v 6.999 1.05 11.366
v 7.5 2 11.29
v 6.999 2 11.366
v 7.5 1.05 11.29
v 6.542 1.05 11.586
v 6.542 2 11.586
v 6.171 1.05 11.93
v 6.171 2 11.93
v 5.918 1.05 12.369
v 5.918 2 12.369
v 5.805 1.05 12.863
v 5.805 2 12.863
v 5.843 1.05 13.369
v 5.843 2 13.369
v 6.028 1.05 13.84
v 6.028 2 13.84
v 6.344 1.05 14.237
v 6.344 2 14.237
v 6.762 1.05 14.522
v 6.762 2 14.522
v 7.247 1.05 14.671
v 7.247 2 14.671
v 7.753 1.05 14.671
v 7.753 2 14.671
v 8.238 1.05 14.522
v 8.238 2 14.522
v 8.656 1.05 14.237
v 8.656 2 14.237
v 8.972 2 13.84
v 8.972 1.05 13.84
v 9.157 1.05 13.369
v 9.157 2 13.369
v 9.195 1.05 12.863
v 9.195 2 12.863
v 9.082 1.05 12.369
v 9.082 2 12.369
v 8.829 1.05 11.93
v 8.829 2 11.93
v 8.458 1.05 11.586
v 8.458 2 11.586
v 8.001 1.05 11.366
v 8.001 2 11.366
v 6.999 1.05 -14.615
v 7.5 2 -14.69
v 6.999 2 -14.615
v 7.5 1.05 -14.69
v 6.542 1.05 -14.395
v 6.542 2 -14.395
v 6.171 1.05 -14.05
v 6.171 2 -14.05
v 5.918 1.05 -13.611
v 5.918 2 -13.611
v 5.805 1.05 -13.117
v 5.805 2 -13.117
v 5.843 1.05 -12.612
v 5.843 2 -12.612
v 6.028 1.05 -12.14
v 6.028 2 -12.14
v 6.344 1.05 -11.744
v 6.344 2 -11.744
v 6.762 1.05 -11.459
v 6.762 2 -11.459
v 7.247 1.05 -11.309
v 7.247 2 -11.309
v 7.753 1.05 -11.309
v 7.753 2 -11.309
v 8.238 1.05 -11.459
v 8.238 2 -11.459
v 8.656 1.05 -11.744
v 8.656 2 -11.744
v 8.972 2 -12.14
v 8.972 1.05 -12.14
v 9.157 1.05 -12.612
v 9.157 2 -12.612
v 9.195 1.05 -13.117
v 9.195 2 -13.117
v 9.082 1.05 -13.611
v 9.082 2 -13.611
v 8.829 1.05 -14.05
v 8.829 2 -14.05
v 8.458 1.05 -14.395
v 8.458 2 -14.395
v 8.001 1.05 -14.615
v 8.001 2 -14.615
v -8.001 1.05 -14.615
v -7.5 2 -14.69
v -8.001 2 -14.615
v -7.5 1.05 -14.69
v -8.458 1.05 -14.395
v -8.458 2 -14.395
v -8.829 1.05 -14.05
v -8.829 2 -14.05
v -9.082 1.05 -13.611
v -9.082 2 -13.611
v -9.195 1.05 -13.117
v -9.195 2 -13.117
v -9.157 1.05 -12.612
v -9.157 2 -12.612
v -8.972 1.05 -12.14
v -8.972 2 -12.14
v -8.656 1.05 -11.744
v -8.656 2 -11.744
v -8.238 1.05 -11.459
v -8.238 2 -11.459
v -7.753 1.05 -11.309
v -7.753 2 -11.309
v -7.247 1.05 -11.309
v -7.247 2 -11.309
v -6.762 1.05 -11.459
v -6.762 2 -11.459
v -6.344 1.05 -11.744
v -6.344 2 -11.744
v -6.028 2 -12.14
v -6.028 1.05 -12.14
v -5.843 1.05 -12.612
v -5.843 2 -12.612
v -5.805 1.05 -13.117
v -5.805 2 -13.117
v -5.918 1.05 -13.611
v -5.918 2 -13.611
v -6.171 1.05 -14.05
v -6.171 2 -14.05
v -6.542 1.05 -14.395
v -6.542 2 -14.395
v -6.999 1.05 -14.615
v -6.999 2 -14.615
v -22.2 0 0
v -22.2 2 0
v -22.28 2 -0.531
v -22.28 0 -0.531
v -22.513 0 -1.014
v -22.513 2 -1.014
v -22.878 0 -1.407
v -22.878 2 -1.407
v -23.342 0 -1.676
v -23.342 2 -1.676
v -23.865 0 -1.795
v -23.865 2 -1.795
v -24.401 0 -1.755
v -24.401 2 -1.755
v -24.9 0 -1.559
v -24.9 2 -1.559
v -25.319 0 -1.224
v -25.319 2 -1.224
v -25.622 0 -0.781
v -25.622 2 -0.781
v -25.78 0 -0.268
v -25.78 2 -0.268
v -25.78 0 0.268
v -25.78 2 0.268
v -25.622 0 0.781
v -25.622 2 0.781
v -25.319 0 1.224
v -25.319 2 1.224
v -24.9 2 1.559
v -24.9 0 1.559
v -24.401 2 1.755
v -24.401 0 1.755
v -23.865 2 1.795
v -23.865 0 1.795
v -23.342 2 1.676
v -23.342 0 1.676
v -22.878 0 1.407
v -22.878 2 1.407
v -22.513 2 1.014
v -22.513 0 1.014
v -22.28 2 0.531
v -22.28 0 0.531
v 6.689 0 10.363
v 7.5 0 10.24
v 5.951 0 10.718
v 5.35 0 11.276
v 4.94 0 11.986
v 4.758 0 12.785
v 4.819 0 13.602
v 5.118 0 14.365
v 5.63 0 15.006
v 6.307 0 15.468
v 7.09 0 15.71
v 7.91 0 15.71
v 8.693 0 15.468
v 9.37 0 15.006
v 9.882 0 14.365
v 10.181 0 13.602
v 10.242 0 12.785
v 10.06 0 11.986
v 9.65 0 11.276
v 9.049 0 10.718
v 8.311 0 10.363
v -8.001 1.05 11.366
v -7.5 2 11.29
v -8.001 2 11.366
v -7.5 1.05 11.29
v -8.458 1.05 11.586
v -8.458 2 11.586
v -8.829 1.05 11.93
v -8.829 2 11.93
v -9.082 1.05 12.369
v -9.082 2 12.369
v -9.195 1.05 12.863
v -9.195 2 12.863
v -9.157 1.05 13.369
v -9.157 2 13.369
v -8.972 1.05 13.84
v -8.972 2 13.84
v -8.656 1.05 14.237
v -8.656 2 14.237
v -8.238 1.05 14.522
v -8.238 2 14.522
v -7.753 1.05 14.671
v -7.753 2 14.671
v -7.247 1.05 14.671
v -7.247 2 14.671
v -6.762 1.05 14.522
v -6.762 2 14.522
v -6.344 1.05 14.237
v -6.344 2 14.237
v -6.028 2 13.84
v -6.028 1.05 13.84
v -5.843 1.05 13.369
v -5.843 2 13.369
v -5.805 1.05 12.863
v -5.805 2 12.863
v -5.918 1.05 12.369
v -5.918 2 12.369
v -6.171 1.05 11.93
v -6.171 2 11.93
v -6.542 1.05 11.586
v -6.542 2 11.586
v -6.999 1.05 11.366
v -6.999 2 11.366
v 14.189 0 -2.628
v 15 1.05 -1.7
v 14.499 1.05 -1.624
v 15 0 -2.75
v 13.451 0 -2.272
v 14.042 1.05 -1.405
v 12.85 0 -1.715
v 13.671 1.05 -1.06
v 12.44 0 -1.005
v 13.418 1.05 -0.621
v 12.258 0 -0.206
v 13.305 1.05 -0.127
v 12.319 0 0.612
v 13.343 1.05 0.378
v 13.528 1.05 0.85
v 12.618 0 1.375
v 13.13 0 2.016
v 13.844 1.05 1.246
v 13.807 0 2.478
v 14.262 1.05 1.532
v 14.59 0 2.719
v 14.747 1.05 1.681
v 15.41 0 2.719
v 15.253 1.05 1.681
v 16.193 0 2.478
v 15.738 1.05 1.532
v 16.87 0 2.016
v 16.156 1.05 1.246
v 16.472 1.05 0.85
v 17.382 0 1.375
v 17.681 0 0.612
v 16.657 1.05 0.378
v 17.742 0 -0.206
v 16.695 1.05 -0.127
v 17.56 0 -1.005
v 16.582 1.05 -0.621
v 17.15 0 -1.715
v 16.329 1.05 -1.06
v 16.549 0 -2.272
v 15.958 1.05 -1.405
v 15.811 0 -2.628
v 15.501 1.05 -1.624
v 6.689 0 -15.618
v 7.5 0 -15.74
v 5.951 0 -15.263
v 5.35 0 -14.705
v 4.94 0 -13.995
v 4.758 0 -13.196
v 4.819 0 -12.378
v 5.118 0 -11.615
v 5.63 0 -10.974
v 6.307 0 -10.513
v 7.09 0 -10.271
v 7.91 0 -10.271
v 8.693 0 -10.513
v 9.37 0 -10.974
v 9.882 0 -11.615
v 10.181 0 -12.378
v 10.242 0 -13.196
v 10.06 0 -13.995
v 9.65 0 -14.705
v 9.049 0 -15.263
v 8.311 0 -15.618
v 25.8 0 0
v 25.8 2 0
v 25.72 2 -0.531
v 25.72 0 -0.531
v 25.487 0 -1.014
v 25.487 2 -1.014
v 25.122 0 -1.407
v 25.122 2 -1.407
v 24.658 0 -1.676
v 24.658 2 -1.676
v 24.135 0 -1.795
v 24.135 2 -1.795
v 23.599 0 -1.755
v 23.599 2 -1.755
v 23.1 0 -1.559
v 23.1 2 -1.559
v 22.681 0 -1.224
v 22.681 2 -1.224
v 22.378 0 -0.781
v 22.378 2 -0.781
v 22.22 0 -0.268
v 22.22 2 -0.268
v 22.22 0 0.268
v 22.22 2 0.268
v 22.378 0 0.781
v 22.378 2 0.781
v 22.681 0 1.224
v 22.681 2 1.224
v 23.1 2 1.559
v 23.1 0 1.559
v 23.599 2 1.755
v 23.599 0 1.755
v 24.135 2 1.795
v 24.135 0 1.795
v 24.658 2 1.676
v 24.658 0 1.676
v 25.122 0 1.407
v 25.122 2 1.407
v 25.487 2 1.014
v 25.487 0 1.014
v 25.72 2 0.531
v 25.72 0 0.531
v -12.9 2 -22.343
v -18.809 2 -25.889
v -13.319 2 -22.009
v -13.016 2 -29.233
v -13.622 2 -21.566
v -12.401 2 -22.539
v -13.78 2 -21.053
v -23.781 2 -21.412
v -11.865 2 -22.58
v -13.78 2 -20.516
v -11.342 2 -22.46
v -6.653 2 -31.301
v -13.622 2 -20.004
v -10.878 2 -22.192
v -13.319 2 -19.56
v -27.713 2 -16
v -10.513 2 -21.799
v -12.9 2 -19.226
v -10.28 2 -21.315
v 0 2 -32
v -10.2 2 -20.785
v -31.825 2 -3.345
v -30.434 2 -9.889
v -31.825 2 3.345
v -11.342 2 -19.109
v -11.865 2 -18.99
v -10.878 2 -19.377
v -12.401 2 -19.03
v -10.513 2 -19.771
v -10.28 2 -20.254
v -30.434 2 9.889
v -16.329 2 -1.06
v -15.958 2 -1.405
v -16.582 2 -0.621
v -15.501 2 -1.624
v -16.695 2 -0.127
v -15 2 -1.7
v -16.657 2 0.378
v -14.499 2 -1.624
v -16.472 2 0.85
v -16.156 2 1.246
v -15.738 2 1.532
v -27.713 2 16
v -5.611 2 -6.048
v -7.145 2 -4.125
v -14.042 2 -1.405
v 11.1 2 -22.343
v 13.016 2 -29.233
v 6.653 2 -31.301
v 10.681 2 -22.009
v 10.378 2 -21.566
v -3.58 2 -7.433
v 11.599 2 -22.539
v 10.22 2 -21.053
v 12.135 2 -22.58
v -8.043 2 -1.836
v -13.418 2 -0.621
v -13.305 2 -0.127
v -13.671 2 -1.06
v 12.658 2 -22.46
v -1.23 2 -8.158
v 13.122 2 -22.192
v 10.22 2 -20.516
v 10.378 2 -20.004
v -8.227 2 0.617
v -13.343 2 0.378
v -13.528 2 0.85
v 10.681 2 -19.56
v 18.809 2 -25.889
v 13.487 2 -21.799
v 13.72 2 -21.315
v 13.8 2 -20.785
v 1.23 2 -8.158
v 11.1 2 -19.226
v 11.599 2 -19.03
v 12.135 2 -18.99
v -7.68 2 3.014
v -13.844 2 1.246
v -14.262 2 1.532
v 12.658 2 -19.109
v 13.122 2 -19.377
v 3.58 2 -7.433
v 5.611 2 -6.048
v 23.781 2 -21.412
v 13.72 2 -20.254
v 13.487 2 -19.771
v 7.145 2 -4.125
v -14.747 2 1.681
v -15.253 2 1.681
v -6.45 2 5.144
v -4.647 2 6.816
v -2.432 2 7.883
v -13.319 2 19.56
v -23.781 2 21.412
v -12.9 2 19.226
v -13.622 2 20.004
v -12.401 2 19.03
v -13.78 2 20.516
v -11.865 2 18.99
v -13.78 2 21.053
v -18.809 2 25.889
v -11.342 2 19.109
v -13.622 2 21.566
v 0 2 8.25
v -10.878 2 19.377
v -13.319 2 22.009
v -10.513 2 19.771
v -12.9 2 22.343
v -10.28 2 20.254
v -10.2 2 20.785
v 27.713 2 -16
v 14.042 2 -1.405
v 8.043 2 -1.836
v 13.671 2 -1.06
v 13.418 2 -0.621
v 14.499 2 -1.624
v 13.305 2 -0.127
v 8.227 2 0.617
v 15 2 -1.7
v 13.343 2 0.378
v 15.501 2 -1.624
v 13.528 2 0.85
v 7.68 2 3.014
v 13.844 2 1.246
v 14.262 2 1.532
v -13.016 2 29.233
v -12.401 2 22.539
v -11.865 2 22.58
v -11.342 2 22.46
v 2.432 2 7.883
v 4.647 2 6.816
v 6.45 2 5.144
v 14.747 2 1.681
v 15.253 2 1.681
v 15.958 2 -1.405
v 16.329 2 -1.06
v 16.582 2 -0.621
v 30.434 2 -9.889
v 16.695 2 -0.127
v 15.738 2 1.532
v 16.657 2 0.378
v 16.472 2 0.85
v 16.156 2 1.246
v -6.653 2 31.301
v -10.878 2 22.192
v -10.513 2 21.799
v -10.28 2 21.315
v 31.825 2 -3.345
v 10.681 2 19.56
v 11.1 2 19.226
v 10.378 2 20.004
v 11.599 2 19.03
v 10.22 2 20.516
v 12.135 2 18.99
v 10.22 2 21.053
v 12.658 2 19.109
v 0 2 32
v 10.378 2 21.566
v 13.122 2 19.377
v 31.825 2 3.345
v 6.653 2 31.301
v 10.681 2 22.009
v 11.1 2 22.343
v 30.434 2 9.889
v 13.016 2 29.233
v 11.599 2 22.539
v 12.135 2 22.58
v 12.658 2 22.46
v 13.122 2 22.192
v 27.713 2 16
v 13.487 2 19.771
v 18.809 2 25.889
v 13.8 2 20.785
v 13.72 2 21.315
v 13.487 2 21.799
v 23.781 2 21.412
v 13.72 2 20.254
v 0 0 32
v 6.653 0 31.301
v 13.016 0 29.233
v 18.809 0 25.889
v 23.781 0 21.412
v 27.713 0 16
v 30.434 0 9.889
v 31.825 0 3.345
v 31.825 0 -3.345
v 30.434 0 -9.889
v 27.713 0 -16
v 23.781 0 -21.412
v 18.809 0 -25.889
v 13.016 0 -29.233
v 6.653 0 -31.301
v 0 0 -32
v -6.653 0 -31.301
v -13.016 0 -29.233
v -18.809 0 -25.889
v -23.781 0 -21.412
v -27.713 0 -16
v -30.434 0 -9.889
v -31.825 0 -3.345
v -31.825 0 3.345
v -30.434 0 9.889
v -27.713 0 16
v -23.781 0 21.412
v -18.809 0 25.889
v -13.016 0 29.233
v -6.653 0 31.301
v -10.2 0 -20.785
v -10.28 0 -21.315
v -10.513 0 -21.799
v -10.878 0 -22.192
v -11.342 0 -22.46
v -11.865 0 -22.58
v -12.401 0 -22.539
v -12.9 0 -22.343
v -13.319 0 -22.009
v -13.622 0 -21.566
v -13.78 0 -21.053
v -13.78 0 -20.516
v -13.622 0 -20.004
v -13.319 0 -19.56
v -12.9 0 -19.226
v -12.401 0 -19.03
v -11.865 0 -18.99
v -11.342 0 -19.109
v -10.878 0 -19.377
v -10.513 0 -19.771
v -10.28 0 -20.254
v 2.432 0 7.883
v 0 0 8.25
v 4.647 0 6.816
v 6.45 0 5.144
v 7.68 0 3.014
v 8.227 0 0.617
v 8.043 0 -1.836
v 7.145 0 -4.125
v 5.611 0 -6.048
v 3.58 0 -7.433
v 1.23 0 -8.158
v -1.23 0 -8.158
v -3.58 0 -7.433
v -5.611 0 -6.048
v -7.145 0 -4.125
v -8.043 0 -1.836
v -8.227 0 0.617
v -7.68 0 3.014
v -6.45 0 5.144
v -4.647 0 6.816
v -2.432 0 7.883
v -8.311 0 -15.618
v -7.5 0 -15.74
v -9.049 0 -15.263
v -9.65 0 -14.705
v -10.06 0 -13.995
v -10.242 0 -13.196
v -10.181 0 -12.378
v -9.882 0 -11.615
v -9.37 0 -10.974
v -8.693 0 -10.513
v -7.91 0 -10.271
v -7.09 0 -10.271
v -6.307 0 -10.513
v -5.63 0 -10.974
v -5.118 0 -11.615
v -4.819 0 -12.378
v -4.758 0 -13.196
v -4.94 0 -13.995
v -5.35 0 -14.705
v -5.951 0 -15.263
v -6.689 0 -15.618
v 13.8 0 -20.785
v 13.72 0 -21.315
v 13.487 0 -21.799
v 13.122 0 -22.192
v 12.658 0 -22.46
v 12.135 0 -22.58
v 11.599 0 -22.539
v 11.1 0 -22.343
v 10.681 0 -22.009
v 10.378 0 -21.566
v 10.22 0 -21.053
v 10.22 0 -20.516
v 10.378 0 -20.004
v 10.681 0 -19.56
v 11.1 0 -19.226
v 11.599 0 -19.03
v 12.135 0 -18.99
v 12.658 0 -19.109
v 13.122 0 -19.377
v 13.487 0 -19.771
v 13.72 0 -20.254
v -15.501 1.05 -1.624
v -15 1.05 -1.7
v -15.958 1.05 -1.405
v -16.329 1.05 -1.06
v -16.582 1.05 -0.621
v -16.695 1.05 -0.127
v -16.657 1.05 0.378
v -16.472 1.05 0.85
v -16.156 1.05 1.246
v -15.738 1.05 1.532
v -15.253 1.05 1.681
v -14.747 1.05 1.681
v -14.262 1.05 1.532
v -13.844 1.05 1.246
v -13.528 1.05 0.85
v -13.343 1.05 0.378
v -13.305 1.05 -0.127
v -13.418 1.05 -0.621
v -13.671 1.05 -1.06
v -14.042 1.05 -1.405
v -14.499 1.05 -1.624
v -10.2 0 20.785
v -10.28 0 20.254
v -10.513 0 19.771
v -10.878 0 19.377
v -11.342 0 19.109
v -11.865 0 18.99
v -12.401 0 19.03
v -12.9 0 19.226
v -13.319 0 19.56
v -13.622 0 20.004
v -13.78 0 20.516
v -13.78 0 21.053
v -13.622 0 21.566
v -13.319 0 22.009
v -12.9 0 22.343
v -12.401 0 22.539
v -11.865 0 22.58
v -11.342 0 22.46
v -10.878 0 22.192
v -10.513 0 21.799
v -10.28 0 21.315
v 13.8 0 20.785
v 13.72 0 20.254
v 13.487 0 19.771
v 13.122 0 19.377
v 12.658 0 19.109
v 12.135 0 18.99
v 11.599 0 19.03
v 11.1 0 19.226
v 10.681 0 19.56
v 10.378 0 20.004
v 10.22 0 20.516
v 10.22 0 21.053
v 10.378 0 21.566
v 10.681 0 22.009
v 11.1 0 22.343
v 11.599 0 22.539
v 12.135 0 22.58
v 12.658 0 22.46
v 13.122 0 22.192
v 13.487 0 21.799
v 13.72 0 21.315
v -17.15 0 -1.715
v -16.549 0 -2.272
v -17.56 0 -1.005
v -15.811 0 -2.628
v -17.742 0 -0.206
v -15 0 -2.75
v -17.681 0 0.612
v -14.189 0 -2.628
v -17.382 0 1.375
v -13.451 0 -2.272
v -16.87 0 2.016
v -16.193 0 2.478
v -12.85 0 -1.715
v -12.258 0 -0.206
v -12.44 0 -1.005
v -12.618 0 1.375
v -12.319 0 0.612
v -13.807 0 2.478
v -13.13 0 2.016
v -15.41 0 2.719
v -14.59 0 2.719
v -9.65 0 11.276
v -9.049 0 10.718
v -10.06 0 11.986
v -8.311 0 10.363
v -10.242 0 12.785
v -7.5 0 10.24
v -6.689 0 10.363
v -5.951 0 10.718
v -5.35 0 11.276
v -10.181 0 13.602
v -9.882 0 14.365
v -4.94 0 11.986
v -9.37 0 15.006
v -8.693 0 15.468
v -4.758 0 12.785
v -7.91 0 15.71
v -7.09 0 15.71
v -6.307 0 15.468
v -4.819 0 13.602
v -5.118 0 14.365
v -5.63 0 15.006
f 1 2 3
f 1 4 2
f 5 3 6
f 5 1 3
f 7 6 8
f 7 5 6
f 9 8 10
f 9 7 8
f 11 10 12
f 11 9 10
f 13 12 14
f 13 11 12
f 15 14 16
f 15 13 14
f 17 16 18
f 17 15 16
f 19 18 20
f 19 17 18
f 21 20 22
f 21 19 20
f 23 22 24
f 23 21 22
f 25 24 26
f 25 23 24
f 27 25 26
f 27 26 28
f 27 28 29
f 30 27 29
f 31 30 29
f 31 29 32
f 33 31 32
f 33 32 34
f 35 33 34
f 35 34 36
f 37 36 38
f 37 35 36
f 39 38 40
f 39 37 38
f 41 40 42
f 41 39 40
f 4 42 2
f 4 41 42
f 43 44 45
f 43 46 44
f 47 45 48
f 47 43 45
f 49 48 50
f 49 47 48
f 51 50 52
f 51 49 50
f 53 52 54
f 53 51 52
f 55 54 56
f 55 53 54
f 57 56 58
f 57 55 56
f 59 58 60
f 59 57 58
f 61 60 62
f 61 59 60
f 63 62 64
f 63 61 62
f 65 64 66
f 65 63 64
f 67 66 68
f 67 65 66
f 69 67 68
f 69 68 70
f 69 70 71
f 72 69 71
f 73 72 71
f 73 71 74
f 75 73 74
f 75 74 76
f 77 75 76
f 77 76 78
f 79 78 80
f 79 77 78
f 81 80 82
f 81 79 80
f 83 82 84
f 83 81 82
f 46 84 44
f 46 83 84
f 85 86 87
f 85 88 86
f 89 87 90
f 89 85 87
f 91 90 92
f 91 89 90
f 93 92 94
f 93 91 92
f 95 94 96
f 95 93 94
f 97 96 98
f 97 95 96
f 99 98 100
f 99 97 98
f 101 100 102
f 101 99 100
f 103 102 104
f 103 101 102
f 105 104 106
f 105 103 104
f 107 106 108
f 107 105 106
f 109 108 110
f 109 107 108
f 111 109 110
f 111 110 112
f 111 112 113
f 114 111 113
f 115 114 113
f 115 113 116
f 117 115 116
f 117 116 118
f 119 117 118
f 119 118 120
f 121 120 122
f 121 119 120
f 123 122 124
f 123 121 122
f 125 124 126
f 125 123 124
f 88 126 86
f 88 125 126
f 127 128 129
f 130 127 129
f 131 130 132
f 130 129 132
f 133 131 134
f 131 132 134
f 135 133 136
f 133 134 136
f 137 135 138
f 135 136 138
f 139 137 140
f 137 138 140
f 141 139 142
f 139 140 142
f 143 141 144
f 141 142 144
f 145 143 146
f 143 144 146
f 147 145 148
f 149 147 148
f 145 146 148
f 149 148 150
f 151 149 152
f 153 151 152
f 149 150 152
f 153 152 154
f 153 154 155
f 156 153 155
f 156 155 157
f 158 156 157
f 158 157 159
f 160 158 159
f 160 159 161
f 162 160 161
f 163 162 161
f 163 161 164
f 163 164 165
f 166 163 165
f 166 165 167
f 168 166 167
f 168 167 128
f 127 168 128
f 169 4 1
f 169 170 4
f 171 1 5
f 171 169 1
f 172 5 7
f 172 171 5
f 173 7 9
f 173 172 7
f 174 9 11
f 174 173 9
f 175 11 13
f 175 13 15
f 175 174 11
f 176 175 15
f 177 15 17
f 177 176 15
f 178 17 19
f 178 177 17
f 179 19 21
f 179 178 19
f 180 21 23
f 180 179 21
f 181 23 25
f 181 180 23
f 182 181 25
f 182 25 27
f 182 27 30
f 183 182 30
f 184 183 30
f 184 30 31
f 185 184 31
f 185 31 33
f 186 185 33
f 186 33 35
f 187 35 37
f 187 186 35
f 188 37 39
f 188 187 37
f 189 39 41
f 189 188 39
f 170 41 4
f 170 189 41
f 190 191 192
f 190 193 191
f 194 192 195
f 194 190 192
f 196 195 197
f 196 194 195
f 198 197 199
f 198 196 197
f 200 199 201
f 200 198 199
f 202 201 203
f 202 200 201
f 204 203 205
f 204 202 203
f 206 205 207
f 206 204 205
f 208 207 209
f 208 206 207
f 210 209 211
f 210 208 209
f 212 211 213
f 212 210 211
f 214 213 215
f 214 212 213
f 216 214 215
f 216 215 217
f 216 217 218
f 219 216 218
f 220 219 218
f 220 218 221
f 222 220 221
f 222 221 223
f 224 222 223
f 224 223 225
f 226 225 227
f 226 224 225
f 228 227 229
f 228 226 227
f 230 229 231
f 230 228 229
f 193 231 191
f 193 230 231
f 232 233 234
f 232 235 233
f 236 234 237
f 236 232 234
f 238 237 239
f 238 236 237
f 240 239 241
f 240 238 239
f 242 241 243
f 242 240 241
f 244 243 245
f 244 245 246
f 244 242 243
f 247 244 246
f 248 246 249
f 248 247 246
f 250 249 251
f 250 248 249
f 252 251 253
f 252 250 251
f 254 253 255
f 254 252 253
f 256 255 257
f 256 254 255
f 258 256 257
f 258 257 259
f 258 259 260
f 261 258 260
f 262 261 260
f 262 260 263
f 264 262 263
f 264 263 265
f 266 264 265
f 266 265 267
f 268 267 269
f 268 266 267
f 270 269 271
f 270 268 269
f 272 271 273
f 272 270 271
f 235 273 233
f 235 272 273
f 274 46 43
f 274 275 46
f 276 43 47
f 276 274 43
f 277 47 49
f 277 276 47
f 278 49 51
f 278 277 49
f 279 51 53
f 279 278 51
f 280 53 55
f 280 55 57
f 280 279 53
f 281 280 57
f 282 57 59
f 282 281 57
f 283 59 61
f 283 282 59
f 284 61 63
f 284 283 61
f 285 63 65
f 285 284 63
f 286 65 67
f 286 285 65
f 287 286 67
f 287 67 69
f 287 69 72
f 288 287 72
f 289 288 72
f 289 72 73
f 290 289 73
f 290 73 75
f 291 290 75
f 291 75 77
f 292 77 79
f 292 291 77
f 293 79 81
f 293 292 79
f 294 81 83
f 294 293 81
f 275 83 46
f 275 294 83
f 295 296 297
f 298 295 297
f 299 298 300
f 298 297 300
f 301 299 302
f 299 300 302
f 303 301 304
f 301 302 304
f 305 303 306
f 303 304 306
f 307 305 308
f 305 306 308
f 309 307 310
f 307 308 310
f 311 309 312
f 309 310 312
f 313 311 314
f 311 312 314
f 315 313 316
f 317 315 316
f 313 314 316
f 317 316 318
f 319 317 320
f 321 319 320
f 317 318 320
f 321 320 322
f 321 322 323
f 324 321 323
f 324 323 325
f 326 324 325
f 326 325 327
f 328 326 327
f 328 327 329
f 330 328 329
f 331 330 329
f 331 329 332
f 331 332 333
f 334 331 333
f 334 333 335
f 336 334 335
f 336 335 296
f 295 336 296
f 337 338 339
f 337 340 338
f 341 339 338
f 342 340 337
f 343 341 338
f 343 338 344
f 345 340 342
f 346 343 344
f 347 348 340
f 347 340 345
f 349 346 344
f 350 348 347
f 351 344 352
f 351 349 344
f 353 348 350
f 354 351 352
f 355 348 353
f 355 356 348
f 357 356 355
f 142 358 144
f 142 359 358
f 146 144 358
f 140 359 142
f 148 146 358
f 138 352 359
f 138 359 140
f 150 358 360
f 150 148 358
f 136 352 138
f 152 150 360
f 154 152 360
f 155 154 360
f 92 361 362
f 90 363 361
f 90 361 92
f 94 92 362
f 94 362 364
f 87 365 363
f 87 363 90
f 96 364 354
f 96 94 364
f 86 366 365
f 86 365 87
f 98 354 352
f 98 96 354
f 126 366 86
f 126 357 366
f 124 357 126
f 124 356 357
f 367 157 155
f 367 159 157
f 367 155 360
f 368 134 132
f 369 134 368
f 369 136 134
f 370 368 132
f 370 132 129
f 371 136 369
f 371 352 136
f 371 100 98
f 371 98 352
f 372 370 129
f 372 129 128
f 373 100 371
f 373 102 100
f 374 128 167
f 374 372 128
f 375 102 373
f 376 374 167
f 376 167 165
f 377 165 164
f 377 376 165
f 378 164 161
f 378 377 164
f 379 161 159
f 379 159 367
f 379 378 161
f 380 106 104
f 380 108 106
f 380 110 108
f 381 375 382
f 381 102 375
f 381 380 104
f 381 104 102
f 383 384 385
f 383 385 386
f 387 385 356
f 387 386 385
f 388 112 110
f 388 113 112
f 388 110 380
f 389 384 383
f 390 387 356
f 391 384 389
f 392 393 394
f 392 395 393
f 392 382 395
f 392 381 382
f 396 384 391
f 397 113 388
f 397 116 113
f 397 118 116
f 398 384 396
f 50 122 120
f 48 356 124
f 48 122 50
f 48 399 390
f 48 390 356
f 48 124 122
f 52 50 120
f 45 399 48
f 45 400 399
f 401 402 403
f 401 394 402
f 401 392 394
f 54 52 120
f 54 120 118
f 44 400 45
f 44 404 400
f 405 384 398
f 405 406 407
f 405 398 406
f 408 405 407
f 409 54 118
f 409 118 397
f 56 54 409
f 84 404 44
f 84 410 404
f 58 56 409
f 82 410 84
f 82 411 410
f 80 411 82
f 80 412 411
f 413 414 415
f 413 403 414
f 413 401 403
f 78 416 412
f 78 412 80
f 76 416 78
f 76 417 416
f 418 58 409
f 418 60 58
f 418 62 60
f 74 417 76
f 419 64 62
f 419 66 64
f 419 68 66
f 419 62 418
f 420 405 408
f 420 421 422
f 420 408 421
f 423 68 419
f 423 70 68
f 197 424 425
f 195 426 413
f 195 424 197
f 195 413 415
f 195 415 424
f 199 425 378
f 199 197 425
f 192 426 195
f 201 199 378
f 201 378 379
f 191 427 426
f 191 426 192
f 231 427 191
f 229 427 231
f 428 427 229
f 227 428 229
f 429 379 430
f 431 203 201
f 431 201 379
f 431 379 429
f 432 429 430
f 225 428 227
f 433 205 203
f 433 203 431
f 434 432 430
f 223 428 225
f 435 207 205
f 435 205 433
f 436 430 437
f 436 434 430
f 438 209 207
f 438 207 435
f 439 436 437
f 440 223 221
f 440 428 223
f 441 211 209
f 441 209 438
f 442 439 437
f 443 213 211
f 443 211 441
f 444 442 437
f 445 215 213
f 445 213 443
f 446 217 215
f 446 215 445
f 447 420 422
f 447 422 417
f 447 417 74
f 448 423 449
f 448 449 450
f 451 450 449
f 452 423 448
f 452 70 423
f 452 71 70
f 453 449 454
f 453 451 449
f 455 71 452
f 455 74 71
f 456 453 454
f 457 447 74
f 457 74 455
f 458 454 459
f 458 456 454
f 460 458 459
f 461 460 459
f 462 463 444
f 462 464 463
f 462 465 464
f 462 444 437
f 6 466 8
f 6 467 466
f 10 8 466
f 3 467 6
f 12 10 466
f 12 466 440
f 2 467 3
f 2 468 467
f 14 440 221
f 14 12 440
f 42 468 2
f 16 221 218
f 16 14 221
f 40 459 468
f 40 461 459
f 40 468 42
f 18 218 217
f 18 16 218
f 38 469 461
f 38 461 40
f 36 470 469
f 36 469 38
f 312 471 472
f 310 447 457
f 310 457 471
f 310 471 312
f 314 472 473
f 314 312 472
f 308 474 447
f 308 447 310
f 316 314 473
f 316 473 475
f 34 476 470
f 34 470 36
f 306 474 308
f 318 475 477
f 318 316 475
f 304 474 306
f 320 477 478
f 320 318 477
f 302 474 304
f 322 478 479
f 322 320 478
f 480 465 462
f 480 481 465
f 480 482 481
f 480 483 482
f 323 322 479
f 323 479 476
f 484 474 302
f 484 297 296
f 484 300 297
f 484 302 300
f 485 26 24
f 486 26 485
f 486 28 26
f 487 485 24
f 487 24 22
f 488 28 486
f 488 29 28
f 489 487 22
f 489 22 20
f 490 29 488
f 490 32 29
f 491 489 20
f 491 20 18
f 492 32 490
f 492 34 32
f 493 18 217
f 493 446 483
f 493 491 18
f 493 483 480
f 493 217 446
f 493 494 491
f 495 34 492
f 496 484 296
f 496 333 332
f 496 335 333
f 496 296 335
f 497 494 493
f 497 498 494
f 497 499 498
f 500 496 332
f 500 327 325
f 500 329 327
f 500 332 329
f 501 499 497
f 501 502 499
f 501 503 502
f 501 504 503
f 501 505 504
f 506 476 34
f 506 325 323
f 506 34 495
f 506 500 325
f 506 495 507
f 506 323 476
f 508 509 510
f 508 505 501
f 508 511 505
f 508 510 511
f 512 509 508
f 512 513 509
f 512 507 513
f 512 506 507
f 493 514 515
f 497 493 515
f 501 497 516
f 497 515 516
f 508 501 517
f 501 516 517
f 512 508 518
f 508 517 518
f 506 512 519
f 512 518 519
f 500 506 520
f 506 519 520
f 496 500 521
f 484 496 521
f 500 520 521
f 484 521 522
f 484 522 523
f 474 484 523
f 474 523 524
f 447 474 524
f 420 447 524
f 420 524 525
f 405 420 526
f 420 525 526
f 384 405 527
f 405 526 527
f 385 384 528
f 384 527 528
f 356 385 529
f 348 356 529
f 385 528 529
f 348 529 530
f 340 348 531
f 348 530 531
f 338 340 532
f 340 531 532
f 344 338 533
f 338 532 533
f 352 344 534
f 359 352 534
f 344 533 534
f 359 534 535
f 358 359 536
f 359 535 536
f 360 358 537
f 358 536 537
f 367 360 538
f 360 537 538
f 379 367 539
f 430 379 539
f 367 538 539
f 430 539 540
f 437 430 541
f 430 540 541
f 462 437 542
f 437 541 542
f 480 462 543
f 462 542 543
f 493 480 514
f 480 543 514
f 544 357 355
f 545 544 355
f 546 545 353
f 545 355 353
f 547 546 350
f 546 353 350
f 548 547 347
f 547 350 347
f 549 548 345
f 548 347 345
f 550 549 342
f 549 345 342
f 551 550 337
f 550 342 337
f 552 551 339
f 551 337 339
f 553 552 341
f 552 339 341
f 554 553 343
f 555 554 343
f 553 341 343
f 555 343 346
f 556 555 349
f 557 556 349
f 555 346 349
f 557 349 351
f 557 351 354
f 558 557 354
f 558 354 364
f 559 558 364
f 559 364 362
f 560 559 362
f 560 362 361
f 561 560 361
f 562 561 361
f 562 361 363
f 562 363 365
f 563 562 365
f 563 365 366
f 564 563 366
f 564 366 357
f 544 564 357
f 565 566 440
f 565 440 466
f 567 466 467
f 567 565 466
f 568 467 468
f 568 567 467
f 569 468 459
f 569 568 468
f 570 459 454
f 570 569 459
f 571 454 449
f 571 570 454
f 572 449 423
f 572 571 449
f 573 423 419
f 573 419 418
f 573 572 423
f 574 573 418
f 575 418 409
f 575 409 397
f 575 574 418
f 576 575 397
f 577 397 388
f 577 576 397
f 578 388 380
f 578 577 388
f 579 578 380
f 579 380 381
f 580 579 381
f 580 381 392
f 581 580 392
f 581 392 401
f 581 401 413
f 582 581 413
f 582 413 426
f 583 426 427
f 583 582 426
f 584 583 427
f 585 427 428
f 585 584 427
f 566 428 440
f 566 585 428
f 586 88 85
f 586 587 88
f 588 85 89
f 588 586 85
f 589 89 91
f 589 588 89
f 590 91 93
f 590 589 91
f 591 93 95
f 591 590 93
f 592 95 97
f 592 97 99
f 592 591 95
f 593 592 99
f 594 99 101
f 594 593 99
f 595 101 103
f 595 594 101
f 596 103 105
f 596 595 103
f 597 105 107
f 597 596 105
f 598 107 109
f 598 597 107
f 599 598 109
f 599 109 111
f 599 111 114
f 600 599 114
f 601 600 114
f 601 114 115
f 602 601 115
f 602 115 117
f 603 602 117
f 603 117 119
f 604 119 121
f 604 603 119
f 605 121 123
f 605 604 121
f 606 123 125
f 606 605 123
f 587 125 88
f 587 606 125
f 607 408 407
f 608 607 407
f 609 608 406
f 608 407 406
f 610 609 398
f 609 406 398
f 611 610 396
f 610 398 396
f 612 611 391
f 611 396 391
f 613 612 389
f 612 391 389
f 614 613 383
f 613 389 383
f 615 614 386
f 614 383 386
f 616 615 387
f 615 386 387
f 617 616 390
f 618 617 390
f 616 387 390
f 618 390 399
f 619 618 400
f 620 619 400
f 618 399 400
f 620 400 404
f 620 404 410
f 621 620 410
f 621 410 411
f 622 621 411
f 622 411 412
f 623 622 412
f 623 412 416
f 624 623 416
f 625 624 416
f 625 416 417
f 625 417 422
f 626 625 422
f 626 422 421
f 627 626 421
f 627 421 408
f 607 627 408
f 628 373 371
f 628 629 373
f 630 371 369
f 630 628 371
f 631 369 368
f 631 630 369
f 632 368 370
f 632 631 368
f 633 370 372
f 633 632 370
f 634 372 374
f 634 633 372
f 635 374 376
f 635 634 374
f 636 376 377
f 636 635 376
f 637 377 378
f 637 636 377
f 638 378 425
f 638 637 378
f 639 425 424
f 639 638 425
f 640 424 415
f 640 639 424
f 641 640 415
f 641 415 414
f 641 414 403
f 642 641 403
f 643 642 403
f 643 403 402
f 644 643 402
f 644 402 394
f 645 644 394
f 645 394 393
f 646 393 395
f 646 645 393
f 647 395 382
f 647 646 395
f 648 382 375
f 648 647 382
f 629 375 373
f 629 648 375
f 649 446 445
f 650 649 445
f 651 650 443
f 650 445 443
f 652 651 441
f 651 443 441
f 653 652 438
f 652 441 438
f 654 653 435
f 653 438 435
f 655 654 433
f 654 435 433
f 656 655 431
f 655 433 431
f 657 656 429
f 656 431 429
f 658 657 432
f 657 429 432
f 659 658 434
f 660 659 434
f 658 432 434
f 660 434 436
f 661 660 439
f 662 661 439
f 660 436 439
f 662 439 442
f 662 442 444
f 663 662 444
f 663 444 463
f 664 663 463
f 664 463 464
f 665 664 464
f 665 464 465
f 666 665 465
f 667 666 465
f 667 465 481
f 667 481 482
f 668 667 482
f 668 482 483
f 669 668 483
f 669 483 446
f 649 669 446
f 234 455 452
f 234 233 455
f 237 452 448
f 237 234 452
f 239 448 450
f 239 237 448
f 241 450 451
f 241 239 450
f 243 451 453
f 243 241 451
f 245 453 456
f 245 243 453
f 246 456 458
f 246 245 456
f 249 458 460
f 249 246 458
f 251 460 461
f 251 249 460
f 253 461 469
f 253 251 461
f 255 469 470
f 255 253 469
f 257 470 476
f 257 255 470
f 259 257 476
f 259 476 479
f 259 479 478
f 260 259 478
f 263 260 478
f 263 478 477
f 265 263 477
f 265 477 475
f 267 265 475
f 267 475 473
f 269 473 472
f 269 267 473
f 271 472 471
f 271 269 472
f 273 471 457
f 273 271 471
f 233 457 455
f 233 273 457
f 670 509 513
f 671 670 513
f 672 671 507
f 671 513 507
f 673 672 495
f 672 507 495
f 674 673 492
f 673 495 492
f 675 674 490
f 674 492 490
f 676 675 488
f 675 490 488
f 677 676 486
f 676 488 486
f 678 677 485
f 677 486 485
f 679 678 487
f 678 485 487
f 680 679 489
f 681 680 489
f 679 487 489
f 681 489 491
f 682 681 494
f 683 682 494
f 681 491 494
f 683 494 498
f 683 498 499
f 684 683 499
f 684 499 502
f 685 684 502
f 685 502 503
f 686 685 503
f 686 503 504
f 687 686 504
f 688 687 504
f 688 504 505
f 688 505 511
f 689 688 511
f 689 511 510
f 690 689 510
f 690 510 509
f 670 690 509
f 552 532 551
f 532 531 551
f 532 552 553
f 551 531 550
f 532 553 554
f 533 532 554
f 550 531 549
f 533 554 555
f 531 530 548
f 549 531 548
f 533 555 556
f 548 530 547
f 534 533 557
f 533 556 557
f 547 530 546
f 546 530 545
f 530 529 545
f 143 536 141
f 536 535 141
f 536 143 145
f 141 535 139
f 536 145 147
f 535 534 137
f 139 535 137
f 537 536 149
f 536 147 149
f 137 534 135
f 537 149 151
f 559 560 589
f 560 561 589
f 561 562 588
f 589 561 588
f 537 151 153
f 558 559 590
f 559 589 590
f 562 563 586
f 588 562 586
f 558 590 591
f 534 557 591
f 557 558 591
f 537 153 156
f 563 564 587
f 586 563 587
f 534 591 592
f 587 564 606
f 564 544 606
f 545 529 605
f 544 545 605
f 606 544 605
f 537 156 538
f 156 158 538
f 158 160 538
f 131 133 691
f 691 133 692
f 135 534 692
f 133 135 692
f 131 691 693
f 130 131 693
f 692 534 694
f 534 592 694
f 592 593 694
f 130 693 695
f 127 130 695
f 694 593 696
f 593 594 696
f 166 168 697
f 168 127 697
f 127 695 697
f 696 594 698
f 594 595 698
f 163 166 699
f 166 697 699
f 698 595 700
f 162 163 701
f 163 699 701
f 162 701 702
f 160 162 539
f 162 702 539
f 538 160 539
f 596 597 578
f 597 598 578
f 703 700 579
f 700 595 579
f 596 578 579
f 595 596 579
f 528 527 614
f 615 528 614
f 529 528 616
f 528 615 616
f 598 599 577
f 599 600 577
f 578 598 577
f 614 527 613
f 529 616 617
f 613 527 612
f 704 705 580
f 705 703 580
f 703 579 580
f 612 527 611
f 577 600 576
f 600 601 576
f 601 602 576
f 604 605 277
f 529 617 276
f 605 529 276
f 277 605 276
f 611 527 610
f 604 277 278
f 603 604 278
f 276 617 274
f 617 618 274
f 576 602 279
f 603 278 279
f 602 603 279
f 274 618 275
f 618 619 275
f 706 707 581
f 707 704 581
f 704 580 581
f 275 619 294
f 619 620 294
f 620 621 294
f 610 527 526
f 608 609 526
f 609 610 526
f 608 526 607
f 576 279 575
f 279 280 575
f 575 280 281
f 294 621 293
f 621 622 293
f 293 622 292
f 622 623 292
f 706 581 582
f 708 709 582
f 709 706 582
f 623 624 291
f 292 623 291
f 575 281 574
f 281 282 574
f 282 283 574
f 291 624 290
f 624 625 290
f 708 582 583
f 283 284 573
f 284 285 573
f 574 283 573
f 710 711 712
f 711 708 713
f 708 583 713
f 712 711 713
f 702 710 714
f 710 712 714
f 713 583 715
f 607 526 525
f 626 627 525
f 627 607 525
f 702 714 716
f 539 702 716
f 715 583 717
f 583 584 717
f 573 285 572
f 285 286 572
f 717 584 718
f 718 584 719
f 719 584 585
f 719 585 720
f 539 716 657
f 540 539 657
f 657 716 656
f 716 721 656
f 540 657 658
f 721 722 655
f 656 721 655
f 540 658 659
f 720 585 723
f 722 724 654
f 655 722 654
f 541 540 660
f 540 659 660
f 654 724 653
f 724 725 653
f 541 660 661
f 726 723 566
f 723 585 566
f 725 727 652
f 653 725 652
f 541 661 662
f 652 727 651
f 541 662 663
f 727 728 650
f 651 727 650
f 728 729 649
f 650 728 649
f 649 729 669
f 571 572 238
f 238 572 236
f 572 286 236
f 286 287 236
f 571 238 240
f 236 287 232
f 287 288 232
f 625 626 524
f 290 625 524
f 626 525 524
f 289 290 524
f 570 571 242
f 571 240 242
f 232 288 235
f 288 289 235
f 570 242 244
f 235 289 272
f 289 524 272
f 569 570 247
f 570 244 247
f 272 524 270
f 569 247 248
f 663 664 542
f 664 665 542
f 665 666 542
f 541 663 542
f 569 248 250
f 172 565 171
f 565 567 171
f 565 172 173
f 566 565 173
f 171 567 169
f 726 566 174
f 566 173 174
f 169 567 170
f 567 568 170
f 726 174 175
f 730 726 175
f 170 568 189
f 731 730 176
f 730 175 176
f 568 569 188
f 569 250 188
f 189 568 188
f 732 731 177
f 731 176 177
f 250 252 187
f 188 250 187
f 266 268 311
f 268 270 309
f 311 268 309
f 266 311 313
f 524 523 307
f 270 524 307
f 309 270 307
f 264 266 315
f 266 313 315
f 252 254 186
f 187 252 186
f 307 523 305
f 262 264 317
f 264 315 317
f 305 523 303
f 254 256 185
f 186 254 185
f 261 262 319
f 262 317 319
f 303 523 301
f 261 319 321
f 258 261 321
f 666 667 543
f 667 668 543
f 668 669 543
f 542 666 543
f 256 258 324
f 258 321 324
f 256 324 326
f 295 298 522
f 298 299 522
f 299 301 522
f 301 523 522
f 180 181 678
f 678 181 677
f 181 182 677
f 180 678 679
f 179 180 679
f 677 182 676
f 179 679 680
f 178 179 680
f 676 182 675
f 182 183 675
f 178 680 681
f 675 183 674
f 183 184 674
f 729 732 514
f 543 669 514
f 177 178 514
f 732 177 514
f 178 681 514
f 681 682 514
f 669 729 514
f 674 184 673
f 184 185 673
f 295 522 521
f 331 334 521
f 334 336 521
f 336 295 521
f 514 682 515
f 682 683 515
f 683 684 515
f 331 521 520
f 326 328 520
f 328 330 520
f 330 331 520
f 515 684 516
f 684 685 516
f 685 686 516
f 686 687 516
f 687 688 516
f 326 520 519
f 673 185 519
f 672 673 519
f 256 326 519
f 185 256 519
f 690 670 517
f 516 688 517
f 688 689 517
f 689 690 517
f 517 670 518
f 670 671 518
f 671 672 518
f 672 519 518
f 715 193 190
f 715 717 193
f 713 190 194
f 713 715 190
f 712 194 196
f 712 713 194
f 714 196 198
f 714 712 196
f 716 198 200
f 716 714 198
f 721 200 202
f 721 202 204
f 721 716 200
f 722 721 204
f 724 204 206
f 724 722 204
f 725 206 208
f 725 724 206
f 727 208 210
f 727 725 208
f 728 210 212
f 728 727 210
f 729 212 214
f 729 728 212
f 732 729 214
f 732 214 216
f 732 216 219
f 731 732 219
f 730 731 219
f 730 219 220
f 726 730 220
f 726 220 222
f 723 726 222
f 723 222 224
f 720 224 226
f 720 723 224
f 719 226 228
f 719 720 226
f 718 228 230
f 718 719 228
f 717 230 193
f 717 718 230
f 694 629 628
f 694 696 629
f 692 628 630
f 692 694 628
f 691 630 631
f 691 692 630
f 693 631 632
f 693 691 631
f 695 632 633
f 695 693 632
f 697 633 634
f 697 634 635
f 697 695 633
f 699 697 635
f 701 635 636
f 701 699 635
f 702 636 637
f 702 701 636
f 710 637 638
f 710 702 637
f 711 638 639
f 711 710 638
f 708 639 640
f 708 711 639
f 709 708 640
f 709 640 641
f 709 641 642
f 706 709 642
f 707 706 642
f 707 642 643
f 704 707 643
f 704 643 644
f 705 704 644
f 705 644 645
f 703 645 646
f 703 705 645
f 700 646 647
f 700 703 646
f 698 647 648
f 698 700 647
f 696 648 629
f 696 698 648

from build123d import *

# Parameters (mm, degrees)
SKETCH1_R                                    = 32
SKETCH1_R_2                                  = 8.25
BOSS_EXTRUDE1_DEPTH                          = 2
CSK_FOR_M3_HEX_SOCKET_COUNTERSUNK_HE_2_COUNT = 2
CSK_FOR_M3_HEX_SOCKET_COUNTERSUNK_HE_2_PITCH = 15
CSK_FOR_M3_HEX_SOCKET_COUNTERSUNK_HE_3_COUNT = 2
CSK_FOR_M3_HEX_SOCKET_COUNTERSUNK_HE_3_PITCH = 25.980762114
CSK_FOR_M3_HEX_SOCKET_COUNTERSUNK_HE_4_COUNT = 2
CSK_FOR_M3_HEX_SOCKET_COUNTERSUNK_HE_4_PITCH = 30
CSK_FOR_M3_HEX_SOCKET_COUNTERSUNK_HE_5_COUNT = 2
CSK_FOR_M3_HEX_SOCKET_COUNTERSUNK_HE_5_PITCH = 25.980762114
CSK_FOR_M3_HEX_SOCKET_COUNTERSUNK_HE_6_COUNT = 2
CSK_FOR_M3_HEX_SOCKET_COUNTERSUNK_HE_6_PITCH = 15
M3_CLEARANCE_HOLE1_D                         = 3.6


with BuildPart() as part:
    # Sketch1 → Boss-Extrude1 (new body)
    with BuildSketch(Plane(origin=(0, 0, 0), x_dir=(1, 0, 0), z_dir=(0, 1, 0))):
        with Locations(Location((0, 0, 0), (0, 0, 270))):
            Circle(SKETCH1_R)
        with Locations(Location((0, 0, 0), (0, 0, 270))):
            Circle(SKETCH1_R_2, mode=Mode.SUBTRACT)
    extrude(amount=BOSS_EXTRUDE1_DEPTH)

    # Sketch4 → CSK for M3 Hex Socket Countersunk Head Screw1 (revolve, cut)
    with BuildSketch(Plane(origin=(-7.5, 0, -12.990381057), x_dir=(0, 0, -1), z_dir=(1, 0, 0))):
        Polygon((0, 0), (0, 2), (1.7, 2), (1.7, 1.05), (2.75, 0), align=None)
    csk_for_m3_hex_socket_countersunk_head_s = revolve(axis=Axis((-7.5, -6.35, -12.990381057), (0, 1, 0)), mode=Mode.SUBTRACT)

    # CSK for M3 Hex Socket Countersunk He 2: CSK for M3 Hex Socket Countersunk Head Screw1 ×2
    with Locations(*[(i * CSK_FOR_M3_HEX_SOCKET_COUNTERSUNK_HE_2_PITCH, 0, 0) for i in range(1, CSK_FOR_M3_HEX_SOCKET_COUNTERSUNK_HE_2_COUNT)]):
        add(csk_for_m3_hex_socket_countersunk_head_s, mode=Mode.SUBTRACT)

    # CSK for M3 Hex Socket Countersunk He 3: CSK for M3 Hex Socket Countersunk Head Screw1 ×2
    with Locations(*[Vector(0.8660254037844752, 0, 0.49999999999993666) * (i * CSK_FOR_M3_HEX_SOCKET_COUNTERSUNK_HE_3_PITCH) for i in range(1, CSK_FOR_M3_HEX_SOCKET_COUNTERSUNK_HE_3_COUNT)]):
        add(csk_for_m3_hex_socket_countersunk_head_s, mode=Mode.SUBTRACT)

    # CSK for M3 Hex Socket Countersunk He 4: CSK for M3 Hex Socket Countersunk Head Screw1 ×2
    with Locations(*[Vector(0.5000000000000633, 0, 0.8660254037844022) * (i * CSK_FOR_M3_HEX_SOCKET_COUNTERSUNK_HE_4_PITCH) for i in range(1, CSK_FOR_M3_HEX_SOCKET_COUNTERSUNK_HE_4_COUNT)]):
        add(csk_for_m3_hex_socket_countersunk_head_s, mode=Mode.SUBTRACT)

    # CSK for M3 Hex Socket Countersunk He 5: CSK for M3 Hex Socket Countersunk Head Screw1 ×2
    with Locations(*[(0, 0, i * CSK_FOR_M3_HEX_SOCKET_COUNTERSUNK_HE_5_PITCH) for i in range(1, CSK_FOR_M3_HEX_SOCKET_COUNTERSUNK_HE_5_COUNT)]):
        add(csk_for_m3_hex_socket_countersunk_head_s, mode=Mode.SUBTRACT)

    # CSK for M3 Hex Socket Countersunk He 6: CSK for M3 Hex Socket Countersunk Head Screw1 ×2
    with Locations(*[Vector(-0.499999999999937, 0, 0.8660254037844751) * (i * CSK_FOR_M3_HEX_SOCKET_COUNTERSUNK_HE_6_PITCH) for i in range(1, CSK_FOR_M3_HEX_SOCKET_COUNTERSUNK_HE_6_COUNT)]):
        add(csk_for_m3_hex_socket_countersunk_head_s, mode=Mode.SUBTRACT)

    # M3 Clearance Hole1 (through all)
    with Locations(Plane(origin=(0, 0, 0), x_dir=(-1, 0, 0), z_dir=(0, -1, 0))):
        with Locations((-12, -20.784609691), (-24, 0), (-12, 20.784609691), (12, 20.784609691), (24, 0), (12, -20.784609691)):
            Hole(M3_CLEARANCE_HOLE1_D / 2)


solid = part.part
